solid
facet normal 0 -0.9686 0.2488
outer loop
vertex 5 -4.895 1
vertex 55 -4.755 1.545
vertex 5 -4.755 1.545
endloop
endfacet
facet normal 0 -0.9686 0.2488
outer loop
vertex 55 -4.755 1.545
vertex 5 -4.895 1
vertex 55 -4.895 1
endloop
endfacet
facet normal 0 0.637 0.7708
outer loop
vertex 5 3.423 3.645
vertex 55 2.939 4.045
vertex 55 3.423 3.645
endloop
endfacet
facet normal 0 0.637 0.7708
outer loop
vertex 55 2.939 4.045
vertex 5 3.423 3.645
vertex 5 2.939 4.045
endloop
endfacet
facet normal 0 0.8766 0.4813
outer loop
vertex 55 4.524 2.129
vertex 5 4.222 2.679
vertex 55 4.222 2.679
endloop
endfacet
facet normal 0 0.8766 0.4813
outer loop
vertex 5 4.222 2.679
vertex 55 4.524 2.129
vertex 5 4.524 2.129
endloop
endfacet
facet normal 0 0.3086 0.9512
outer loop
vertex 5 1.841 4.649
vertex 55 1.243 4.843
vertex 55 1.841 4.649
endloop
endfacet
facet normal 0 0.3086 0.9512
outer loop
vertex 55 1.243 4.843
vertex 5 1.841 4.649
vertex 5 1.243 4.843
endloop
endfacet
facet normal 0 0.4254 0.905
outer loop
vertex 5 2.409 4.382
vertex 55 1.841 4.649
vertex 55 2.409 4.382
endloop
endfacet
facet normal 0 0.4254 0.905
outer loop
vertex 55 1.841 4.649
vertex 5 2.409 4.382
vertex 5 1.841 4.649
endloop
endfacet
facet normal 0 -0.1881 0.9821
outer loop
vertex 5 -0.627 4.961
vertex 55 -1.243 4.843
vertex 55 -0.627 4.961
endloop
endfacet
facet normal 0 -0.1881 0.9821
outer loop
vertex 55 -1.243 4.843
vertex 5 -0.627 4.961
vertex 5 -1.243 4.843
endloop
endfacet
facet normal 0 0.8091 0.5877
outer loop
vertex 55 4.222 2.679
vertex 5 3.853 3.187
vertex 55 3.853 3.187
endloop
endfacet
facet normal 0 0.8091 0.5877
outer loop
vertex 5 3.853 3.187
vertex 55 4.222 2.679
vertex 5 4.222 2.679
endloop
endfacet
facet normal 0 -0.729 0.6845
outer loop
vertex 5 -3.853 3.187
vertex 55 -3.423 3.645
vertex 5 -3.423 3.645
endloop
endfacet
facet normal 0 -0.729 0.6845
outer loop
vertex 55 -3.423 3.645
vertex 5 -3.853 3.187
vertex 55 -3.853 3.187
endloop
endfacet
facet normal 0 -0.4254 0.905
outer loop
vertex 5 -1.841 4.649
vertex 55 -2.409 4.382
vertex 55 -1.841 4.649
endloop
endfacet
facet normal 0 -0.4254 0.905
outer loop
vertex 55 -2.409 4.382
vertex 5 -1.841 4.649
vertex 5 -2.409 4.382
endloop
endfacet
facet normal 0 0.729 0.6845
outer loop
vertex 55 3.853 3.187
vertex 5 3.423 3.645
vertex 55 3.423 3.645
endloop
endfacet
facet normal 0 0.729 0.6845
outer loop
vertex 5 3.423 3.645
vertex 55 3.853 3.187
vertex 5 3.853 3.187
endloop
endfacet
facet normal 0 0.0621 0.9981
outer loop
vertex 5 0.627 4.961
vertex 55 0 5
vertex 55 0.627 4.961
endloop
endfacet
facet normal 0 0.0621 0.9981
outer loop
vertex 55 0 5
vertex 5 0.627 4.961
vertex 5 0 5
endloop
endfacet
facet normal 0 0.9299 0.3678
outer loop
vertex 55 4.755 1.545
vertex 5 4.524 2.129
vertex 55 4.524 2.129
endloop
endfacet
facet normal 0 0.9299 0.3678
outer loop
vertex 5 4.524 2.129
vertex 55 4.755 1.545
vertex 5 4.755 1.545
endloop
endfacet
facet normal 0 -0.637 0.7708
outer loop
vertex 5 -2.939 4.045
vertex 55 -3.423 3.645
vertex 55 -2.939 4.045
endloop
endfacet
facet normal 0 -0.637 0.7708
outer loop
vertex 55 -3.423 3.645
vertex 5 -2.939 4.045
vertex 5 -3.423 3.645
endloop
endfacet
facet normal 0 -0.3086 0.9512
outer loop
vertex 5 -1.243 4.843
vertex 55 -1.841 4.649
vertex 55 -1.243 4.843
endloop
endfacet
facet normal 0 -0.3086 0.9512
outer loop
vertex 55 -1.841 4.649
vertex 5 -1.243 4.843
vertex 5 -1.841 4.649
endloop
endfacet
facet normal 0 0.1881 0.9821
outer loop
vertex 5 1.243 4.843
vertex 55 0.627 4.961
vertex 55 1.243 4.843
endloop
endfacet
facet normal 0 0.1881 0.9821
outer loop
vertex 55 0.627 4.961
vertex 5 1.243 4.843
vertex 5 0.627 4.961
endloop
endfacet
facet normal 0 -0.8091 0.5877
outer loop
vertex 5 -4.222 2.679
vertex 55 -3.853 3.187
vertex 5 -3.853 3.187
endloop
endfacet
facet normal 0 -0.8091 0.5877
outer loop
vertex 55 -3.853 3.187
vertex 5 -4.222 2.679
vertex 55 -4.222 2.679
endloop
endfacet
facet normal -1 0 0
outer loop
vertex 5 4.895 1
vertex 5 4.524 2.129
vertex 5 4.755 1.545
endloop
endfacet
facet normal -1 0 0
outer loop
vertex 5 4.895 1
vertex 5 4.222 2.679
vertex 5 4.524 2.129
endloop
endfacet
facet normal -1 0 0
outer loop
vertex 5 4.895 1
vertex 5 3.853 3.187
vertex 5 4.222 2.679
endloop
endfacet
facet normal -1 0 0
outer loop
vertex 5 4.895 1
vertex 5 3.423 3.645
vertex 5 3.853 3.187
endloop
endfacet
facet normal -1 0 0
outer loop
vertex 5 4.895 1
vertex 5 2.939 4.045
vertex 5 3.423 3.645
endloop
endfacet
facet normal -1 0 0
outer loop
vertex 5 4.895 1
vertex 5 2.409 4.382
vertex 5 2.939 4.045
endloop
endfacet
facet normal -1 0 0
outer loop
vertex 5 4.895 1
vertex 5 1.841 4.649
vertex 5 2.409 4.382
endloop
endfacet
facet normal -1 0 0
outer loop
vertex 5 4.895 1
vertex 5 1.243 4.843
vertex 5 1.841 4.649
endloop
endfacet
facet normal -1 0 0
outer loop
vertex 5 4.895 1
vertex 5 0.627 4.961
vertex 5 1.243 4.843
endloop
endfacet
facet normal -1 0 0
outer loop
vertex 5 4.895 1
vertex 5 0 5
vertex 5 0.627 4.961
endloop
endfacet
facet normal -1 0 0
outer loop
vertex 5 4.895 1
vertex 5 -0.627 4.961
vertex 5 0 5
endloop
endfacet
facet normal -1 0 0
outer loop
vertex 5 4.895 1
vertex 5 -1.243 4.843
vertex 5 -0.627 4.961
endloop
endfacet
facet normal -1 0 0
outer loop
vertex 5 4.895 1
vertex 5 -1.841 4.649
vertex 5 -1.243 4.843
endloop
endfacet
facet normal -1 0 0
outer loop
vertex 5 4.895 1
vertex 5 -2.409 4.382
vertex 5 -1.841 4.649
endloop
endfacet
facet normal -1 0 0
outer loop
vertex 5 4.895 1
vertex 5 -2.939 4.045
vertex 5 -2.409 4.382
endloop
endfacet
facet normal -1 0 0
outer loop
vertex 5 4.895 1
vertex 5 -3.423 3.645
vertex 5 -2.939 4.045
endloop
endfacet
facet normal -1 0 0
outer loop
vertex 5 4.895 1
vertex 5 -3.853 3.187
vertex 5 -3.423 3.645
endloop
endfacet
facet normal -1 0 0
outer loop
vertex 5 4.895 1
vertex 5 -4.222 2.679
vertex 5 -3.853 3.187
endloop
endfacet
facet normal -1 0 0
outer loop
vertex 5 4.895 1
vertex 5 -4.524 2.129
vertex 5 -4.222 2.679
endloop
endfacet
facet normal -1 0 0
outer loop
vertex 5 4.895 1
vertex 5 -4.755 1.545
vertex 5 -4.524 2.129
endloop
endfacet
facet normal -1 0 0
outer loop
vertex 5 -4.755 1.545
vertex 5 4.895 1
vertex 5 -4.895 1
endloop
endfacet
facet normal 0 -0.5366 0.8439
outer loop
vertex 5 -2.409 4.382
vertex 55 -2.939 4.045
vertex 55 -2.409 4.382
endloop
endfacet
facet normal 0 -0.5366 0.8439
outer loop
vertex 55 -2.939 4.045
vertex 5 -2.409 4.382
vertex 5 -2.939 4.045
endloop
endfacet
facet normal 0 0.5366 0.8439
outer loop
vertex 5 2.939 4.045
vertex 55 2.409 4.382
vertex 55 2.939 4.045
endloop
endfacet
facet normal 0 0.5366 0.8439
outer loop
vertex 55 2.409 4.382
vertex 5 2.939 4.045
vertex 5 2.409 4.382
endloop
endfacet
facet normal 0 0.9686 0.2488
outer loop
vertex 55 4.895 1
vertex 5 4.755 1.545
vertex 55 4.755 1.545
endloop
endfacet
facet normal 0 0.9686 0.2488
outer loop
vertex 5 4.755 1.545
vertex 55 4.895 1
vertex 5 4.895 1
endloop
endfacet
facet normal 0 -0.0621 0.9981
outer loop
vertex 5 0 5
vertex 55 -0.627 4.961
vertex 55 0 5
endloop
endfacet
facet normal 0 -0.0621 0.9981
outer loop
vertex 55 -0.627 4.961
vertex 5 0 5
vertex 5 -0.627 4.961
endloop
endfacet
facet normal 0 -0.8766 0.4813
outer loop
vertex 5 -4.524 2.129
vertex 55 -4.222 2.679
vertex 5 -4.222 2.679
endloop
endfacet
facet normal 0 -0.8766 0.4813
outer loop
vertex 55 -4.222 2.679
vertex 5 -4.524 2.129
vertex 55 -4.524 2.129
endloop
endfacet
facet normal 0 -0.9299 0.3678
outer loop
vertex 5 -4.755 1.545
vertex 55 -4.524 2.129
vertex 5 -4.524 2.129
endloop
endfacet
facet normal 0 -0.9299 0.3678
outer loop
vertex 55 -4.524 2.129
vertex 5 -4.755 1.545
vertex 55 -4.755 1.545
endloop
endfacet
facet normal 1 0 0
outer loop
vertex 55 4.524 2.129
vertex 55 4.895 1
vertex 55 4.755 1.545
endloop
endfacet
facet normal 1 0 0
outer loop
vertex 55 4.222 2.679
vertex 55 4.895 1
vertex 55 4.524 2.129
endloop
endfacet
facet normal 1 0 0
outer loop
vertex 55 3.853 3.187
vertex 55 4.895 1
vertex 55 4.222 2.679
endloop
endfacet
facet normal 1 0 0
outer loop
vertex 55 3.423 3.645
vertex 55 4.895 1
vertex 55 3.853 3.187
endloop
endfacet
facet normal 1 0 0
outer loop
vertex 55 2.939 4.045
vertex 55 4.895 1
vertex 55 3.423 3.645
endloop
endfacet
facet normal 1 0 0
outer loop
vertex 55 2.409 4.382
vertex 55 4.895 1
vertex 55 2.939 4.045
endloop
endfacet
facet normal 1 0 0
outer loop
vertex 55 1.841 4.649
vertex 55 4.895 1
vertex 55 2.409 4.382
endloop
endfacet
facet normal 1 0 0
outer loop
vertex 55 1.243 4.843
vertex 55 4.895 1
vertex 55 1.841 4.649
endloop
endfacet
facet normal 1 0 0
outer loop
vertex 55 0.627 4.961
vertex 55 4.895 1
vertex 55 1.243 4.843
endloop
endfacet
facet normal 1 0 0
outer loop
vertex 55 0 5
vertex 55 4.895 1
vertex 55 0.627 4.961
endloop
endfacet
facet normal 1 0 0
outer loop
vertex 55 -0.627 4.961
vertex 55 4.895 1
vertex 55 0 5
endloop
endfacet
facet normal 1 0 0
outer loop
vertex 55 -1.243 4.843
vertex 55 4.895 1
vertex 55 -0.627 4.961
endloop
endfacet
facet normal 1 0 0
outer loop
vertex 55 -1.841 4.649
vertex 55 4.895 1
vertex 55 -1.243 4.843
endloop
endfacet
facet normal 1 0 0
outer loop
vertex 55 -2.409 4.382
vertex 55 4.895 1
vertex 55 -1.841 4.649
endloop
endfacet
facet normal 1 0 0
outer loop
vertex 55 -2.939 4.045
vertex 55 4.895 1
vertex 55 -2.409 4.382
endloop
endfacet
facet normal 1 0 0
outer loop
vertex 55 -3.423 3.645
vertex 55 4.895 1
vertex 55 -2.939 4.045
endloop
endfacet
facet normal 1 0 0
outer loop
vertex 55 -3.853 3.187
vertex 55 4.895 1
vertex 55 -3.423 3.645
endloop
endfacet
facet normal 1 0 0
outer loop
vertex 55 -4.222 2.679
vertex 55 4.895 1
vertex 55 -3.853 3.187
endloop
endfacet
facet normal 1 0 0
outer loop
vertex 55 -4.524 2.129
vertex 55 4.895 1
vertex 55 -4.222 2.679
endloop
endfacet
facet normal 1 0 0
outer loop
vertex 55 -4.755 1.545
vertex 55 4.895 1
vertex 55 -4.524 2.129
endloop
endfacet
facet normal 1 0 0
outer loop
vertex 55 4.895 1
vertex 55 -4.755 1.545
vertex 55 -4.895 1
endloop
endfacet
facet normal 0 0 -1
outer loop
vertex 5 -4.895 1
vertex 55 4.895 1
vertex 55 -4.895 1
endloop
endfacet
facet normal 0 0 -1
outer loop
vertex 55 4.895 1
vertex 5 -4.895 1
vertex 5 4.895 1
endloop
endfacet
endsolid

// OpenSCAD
module beam() {
		difference() {
				rotate(a=[0,90,0]) cylinder(h=50, r=5, $fn=50);
				translate([25, 0, -3])  
					cube( size = [55, 15, 8], center = true );
		}
}

module endPiece() {
		cube( size = [5, 12, 5], center = true);
}


module moldedEndPiece() {
		difference() {
				endPiece();
				translate([50, 0, 0]) endPiece();
				translate([0, 0, -1]) beam();
		}
}

translate([5, 0, 0]) beam();
//translate([0, 0, 4]) moldedEndPiece();
//translate([-10, 0, 4]) moldedEndPiece();
